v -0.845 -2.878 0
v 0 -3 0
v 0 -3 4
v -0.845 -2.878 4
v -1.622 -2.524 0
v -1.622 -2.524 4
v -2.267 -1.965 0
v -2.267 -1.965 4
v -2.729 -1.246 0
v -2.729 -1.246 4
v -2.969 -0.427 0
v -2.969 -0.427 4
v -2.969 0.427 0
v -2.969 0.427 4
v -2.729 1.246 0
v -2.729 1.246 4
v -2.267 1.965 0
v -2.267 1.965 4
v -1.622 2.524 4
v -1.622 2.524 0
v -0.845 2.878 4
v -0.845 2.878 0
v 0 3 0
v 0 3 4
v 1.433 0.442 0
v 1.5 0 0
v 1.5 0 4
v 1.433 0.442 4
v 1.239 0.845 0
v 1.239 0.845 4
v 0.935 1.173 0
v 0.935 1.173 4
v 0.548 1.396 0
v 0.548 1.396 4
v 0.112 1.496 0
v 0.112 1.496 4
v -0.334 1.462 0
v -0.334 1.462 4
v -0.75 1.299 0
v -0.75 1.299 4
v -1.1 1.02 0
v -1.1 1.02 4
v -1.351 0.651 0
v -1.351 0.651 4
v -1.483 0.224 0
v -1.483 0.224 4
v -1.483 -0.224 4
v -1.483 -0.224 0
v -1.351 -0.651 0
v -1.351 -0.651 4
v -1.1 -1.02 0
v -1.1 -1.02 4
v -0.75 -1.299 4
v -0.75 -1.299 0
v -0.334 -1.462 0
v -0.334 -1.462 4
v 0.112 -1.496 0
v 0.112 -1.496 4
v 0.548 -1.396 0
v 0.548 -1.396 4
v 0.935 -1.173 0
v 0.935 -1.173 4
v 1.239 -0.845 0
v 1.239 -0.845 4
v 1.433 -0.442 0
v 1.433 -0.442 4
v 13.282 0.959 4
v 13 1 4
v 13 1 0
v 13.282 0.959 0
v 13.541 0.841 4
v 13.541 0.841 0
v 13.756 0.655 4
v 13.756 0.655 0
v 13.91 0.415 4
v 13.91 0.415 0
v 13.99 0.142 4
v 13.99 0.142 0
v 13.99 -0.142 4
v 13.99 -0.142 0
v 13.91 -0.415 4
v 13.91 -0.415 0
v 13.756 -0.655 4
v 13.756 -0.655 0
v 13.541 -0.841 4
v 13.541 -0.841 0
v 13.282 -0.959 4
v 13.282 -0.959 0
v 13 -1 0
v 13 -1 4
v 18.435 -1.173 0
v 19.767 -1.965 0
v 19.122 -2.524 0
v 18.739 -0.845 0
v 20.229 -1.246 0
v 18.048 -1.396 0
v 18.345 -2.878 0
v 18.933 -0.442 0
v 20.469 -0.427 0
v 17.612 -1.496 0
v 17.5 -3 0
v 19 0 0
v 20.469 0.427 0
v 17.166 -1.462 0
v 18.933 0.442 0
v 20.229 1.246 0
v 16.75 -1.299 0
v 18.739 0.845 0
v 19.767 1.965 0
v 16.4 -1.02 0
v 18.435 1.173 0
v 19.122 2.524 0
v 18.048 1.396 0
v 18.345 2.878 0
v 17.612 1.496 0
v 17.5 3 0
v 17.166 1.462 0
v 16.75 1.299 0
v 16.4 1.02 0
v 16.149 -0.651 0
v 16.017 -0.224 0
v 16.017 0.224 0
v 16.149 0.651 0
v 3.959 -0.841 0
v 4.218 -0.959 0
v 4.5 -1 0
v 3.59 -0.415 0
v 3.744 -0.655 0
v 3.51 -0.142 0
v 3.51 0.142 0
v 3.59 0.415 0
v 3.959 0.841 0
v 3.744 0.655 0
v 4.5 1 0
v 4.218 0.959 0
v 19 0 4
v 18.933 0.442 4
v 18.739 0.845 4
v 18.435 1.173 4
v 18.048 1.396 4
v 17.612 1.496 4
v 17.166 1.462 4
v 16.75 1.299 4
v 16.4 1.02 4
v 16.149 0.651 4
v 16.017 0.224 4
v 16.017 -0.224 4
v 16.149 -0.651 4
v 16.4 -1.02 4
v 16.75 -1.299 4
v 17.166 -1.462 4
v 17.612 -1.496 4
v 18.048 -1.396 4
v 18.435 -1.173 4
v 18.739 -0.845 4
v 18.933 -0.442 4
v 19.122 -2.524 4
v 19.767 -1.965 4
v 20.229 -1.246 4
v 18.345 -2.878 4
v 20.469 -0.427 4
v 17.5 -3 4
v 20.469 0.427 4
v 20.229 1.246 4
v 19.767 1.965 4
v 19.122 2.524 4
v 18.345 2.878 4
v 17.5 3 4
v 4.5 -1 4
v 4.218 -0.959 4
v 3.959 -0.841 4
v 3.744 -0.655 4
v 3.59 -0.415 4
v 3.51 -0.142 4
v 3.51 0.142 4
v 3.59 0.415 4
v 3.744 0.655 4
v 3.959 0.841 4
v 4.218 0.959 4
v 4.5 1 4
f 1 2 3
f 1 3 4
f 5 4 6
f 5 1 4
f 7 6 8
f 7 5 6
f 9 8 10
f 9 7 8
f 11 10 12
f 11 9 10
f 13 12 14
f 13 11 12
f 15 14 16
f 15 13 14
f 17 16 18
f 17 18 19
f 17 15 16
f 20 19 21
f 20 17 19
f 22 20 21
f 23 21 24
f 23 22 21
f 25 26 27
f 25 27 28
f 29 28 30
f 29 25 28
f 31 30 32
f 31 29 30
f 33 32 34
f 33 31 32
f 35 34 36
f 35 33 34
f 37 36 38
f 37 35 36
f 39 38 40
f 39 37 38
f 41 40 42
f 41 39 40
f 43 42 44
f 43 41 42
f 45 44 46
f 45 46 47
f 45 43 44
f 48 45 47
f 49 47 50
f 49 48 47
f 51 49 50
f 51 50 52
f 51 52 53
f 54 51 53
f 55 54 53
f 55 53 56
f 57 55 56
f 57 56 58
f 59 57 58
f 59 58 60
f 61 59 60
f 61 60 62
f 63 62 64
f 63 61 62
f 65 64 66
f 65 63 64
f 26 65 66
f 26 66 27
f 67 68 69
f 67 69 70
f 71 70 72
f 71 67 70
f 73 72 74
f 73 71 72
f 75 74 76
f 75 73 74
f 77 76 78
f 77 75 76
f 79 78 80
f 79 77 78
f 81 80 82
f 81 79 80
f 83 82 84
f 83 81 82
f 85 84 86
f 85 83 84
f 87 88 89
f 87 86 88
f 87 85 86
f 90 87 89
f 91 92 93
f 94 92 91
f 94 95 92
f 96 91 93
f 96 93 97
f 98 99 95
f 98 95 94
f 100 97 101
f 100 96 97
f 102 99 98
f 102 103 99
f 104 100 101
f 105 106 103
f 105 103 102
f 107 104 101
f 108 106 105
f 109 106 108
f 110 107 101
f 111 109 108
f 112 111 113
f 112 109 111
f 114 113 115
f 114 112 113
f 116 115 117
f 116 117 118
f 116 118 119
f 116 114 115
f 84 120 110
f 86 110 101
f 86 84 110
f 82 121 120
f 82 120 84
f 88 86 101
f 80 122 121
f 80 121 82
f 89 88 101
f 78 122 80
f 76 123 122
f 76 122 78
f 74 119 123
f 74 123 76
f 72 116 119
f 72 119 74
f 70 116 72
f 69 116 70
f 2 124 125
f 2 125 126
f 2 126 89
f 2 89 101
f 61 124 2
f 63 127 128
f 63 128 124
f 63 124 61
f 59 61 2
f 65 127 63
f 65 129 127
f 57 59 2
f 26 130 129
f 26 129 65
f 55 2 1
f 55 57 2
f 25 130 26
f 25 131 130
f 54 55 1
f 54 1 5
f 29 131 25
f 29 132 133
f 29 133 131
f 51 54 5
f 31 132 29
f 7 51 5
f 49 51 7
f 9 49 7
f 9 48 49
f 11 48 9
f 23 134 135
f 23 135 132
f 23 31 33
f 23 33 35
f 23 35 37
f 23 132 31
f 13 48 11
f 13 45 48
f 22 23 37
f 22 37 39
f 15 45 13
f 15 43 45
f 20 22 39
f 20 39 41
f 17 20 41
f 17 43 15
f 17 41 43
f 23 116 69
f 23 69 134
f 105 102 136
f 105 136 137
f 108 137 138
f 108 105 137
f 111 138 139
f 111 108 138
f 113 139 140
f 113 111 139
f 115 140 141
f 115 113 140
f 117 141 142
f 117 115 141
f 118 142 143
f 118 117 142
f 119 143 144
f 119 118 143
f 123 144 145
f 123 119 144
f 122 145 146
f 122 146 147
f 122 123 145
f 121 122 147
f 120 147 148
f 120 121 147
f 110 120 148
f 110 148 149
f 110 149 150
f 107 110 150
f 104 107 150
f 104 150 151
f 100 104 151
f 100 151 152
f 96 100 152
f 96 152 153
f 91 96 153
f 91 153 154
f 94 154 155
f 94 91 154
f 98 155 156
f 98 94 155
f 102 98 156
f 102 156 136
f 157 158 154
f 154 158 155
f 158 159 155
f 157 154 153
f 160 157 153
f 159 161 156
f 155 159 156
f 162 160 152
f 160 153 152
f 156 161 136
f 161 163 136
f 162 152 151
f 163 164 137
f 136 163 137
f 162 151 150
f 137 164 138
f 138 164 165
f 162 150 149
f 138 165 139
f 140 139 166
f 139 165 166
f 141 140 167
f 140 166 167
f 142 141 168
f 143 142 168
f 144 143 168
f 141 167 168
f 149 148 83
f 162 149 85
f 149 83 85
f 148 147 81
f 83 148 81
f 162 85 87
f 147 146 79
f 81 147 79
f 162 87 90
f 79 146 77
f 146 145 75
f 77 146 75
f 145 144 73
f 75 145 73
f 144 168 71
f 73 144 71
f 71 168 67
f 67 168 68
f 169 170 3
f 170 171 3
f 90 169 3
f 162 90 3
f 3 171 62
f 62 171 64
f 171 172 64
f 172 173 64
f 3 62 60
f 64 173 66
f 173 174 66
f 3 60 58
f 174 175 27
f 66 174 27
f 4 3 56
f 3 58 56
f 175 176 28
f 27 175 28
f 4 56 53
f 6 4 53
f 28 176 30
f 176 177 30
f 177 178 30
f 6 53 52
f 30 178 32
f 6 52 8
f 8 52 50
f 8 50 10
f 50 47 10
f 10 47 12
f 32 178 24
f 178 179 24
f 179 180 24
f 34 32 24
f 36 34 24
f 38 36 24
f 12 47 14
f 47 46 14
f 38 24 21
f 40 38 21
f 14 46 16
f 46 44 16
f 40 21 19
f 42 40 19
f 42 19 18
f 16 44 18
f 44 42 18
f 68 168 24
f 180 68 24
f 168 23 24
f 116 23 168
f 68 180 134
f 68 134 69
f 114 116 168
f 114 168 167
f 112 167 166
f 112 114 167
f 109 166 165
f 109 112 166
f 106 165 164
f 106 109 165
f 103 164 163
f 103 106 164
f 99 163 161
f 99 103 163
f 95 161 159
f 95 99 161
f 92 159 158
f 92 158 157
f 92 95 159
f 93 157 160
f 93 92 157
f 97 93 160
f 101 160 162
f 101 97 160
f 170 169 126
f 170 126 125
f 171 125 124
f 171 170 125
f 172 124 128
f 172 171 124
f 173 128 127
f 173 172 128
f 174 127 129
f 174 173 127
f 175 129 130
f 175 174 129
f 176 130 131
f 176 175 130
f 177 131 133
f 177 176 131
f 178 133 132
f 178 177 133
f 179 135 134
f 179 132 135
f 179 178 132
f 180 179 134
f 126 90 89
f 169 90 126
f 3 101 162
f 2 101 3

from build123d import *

# Parameters (mm, degrees)
ESQUISSE1_R             = 1.5
BOSS_EXTRU_1_DEPTH      = 4
ENL_V_MAT_EXTRU_1_REACH = 23.101


with BuildPart() as part:
    # Esquisse1 → Boss.-Extru.1 (new body)
    with BuildSketch(Plane.XY):
        with BuildLine():
            Line((0, 3), (17.5, 3))
            ThreePointArc((17.5, 3), (20.5, 0), (17.5, -3))
            Line((17.5, -3), (0, -3))
            ThreePointArc((0, -3), (-3, 0), (0, 3))
        make_face()
        Circle(ESQUISSE1_R, mode=Mode.SUBTRACT)
        with Locations((17.5, 0)):
            Circle(ESQUISSE1_R, mode=Mode.SUBTRACT)
    extrude(amount=BOSS_EXTRU_1_DEPTH)

    # Esquisse2 → Enlèv. mat.-Extru.1 (cut, up to next)
    with BuildSketch(Plane.XY.offset(4), mode=Mode.PRIVATE) as enl_v_mat_extru_1_sk1:
        with BuildLine():
            Line((4.5, 1), (13, 1))
            ThreePointArc((13, 1), (14, 0), (13, -1))
            Line((13, -1), (4.5, -1))
            ThreePointArc((4.5, -1), (3.5, 0), (4.5, 1))
        make_face()
    enl_v_mat_extru_1_tool1 = extrude(enl_v_mat_extru_1_sk1.sketch, amount=-ENL_V_MAT_EXTRU_1_REACH, mode=Mode.PRIVATE) & part.part
    add(enl_v_mat_extru_1_tool1.solids().sort_by_distance((8.75, 0, 4))[0], mode=Mode.SUBTRACT)


solid = part.part
